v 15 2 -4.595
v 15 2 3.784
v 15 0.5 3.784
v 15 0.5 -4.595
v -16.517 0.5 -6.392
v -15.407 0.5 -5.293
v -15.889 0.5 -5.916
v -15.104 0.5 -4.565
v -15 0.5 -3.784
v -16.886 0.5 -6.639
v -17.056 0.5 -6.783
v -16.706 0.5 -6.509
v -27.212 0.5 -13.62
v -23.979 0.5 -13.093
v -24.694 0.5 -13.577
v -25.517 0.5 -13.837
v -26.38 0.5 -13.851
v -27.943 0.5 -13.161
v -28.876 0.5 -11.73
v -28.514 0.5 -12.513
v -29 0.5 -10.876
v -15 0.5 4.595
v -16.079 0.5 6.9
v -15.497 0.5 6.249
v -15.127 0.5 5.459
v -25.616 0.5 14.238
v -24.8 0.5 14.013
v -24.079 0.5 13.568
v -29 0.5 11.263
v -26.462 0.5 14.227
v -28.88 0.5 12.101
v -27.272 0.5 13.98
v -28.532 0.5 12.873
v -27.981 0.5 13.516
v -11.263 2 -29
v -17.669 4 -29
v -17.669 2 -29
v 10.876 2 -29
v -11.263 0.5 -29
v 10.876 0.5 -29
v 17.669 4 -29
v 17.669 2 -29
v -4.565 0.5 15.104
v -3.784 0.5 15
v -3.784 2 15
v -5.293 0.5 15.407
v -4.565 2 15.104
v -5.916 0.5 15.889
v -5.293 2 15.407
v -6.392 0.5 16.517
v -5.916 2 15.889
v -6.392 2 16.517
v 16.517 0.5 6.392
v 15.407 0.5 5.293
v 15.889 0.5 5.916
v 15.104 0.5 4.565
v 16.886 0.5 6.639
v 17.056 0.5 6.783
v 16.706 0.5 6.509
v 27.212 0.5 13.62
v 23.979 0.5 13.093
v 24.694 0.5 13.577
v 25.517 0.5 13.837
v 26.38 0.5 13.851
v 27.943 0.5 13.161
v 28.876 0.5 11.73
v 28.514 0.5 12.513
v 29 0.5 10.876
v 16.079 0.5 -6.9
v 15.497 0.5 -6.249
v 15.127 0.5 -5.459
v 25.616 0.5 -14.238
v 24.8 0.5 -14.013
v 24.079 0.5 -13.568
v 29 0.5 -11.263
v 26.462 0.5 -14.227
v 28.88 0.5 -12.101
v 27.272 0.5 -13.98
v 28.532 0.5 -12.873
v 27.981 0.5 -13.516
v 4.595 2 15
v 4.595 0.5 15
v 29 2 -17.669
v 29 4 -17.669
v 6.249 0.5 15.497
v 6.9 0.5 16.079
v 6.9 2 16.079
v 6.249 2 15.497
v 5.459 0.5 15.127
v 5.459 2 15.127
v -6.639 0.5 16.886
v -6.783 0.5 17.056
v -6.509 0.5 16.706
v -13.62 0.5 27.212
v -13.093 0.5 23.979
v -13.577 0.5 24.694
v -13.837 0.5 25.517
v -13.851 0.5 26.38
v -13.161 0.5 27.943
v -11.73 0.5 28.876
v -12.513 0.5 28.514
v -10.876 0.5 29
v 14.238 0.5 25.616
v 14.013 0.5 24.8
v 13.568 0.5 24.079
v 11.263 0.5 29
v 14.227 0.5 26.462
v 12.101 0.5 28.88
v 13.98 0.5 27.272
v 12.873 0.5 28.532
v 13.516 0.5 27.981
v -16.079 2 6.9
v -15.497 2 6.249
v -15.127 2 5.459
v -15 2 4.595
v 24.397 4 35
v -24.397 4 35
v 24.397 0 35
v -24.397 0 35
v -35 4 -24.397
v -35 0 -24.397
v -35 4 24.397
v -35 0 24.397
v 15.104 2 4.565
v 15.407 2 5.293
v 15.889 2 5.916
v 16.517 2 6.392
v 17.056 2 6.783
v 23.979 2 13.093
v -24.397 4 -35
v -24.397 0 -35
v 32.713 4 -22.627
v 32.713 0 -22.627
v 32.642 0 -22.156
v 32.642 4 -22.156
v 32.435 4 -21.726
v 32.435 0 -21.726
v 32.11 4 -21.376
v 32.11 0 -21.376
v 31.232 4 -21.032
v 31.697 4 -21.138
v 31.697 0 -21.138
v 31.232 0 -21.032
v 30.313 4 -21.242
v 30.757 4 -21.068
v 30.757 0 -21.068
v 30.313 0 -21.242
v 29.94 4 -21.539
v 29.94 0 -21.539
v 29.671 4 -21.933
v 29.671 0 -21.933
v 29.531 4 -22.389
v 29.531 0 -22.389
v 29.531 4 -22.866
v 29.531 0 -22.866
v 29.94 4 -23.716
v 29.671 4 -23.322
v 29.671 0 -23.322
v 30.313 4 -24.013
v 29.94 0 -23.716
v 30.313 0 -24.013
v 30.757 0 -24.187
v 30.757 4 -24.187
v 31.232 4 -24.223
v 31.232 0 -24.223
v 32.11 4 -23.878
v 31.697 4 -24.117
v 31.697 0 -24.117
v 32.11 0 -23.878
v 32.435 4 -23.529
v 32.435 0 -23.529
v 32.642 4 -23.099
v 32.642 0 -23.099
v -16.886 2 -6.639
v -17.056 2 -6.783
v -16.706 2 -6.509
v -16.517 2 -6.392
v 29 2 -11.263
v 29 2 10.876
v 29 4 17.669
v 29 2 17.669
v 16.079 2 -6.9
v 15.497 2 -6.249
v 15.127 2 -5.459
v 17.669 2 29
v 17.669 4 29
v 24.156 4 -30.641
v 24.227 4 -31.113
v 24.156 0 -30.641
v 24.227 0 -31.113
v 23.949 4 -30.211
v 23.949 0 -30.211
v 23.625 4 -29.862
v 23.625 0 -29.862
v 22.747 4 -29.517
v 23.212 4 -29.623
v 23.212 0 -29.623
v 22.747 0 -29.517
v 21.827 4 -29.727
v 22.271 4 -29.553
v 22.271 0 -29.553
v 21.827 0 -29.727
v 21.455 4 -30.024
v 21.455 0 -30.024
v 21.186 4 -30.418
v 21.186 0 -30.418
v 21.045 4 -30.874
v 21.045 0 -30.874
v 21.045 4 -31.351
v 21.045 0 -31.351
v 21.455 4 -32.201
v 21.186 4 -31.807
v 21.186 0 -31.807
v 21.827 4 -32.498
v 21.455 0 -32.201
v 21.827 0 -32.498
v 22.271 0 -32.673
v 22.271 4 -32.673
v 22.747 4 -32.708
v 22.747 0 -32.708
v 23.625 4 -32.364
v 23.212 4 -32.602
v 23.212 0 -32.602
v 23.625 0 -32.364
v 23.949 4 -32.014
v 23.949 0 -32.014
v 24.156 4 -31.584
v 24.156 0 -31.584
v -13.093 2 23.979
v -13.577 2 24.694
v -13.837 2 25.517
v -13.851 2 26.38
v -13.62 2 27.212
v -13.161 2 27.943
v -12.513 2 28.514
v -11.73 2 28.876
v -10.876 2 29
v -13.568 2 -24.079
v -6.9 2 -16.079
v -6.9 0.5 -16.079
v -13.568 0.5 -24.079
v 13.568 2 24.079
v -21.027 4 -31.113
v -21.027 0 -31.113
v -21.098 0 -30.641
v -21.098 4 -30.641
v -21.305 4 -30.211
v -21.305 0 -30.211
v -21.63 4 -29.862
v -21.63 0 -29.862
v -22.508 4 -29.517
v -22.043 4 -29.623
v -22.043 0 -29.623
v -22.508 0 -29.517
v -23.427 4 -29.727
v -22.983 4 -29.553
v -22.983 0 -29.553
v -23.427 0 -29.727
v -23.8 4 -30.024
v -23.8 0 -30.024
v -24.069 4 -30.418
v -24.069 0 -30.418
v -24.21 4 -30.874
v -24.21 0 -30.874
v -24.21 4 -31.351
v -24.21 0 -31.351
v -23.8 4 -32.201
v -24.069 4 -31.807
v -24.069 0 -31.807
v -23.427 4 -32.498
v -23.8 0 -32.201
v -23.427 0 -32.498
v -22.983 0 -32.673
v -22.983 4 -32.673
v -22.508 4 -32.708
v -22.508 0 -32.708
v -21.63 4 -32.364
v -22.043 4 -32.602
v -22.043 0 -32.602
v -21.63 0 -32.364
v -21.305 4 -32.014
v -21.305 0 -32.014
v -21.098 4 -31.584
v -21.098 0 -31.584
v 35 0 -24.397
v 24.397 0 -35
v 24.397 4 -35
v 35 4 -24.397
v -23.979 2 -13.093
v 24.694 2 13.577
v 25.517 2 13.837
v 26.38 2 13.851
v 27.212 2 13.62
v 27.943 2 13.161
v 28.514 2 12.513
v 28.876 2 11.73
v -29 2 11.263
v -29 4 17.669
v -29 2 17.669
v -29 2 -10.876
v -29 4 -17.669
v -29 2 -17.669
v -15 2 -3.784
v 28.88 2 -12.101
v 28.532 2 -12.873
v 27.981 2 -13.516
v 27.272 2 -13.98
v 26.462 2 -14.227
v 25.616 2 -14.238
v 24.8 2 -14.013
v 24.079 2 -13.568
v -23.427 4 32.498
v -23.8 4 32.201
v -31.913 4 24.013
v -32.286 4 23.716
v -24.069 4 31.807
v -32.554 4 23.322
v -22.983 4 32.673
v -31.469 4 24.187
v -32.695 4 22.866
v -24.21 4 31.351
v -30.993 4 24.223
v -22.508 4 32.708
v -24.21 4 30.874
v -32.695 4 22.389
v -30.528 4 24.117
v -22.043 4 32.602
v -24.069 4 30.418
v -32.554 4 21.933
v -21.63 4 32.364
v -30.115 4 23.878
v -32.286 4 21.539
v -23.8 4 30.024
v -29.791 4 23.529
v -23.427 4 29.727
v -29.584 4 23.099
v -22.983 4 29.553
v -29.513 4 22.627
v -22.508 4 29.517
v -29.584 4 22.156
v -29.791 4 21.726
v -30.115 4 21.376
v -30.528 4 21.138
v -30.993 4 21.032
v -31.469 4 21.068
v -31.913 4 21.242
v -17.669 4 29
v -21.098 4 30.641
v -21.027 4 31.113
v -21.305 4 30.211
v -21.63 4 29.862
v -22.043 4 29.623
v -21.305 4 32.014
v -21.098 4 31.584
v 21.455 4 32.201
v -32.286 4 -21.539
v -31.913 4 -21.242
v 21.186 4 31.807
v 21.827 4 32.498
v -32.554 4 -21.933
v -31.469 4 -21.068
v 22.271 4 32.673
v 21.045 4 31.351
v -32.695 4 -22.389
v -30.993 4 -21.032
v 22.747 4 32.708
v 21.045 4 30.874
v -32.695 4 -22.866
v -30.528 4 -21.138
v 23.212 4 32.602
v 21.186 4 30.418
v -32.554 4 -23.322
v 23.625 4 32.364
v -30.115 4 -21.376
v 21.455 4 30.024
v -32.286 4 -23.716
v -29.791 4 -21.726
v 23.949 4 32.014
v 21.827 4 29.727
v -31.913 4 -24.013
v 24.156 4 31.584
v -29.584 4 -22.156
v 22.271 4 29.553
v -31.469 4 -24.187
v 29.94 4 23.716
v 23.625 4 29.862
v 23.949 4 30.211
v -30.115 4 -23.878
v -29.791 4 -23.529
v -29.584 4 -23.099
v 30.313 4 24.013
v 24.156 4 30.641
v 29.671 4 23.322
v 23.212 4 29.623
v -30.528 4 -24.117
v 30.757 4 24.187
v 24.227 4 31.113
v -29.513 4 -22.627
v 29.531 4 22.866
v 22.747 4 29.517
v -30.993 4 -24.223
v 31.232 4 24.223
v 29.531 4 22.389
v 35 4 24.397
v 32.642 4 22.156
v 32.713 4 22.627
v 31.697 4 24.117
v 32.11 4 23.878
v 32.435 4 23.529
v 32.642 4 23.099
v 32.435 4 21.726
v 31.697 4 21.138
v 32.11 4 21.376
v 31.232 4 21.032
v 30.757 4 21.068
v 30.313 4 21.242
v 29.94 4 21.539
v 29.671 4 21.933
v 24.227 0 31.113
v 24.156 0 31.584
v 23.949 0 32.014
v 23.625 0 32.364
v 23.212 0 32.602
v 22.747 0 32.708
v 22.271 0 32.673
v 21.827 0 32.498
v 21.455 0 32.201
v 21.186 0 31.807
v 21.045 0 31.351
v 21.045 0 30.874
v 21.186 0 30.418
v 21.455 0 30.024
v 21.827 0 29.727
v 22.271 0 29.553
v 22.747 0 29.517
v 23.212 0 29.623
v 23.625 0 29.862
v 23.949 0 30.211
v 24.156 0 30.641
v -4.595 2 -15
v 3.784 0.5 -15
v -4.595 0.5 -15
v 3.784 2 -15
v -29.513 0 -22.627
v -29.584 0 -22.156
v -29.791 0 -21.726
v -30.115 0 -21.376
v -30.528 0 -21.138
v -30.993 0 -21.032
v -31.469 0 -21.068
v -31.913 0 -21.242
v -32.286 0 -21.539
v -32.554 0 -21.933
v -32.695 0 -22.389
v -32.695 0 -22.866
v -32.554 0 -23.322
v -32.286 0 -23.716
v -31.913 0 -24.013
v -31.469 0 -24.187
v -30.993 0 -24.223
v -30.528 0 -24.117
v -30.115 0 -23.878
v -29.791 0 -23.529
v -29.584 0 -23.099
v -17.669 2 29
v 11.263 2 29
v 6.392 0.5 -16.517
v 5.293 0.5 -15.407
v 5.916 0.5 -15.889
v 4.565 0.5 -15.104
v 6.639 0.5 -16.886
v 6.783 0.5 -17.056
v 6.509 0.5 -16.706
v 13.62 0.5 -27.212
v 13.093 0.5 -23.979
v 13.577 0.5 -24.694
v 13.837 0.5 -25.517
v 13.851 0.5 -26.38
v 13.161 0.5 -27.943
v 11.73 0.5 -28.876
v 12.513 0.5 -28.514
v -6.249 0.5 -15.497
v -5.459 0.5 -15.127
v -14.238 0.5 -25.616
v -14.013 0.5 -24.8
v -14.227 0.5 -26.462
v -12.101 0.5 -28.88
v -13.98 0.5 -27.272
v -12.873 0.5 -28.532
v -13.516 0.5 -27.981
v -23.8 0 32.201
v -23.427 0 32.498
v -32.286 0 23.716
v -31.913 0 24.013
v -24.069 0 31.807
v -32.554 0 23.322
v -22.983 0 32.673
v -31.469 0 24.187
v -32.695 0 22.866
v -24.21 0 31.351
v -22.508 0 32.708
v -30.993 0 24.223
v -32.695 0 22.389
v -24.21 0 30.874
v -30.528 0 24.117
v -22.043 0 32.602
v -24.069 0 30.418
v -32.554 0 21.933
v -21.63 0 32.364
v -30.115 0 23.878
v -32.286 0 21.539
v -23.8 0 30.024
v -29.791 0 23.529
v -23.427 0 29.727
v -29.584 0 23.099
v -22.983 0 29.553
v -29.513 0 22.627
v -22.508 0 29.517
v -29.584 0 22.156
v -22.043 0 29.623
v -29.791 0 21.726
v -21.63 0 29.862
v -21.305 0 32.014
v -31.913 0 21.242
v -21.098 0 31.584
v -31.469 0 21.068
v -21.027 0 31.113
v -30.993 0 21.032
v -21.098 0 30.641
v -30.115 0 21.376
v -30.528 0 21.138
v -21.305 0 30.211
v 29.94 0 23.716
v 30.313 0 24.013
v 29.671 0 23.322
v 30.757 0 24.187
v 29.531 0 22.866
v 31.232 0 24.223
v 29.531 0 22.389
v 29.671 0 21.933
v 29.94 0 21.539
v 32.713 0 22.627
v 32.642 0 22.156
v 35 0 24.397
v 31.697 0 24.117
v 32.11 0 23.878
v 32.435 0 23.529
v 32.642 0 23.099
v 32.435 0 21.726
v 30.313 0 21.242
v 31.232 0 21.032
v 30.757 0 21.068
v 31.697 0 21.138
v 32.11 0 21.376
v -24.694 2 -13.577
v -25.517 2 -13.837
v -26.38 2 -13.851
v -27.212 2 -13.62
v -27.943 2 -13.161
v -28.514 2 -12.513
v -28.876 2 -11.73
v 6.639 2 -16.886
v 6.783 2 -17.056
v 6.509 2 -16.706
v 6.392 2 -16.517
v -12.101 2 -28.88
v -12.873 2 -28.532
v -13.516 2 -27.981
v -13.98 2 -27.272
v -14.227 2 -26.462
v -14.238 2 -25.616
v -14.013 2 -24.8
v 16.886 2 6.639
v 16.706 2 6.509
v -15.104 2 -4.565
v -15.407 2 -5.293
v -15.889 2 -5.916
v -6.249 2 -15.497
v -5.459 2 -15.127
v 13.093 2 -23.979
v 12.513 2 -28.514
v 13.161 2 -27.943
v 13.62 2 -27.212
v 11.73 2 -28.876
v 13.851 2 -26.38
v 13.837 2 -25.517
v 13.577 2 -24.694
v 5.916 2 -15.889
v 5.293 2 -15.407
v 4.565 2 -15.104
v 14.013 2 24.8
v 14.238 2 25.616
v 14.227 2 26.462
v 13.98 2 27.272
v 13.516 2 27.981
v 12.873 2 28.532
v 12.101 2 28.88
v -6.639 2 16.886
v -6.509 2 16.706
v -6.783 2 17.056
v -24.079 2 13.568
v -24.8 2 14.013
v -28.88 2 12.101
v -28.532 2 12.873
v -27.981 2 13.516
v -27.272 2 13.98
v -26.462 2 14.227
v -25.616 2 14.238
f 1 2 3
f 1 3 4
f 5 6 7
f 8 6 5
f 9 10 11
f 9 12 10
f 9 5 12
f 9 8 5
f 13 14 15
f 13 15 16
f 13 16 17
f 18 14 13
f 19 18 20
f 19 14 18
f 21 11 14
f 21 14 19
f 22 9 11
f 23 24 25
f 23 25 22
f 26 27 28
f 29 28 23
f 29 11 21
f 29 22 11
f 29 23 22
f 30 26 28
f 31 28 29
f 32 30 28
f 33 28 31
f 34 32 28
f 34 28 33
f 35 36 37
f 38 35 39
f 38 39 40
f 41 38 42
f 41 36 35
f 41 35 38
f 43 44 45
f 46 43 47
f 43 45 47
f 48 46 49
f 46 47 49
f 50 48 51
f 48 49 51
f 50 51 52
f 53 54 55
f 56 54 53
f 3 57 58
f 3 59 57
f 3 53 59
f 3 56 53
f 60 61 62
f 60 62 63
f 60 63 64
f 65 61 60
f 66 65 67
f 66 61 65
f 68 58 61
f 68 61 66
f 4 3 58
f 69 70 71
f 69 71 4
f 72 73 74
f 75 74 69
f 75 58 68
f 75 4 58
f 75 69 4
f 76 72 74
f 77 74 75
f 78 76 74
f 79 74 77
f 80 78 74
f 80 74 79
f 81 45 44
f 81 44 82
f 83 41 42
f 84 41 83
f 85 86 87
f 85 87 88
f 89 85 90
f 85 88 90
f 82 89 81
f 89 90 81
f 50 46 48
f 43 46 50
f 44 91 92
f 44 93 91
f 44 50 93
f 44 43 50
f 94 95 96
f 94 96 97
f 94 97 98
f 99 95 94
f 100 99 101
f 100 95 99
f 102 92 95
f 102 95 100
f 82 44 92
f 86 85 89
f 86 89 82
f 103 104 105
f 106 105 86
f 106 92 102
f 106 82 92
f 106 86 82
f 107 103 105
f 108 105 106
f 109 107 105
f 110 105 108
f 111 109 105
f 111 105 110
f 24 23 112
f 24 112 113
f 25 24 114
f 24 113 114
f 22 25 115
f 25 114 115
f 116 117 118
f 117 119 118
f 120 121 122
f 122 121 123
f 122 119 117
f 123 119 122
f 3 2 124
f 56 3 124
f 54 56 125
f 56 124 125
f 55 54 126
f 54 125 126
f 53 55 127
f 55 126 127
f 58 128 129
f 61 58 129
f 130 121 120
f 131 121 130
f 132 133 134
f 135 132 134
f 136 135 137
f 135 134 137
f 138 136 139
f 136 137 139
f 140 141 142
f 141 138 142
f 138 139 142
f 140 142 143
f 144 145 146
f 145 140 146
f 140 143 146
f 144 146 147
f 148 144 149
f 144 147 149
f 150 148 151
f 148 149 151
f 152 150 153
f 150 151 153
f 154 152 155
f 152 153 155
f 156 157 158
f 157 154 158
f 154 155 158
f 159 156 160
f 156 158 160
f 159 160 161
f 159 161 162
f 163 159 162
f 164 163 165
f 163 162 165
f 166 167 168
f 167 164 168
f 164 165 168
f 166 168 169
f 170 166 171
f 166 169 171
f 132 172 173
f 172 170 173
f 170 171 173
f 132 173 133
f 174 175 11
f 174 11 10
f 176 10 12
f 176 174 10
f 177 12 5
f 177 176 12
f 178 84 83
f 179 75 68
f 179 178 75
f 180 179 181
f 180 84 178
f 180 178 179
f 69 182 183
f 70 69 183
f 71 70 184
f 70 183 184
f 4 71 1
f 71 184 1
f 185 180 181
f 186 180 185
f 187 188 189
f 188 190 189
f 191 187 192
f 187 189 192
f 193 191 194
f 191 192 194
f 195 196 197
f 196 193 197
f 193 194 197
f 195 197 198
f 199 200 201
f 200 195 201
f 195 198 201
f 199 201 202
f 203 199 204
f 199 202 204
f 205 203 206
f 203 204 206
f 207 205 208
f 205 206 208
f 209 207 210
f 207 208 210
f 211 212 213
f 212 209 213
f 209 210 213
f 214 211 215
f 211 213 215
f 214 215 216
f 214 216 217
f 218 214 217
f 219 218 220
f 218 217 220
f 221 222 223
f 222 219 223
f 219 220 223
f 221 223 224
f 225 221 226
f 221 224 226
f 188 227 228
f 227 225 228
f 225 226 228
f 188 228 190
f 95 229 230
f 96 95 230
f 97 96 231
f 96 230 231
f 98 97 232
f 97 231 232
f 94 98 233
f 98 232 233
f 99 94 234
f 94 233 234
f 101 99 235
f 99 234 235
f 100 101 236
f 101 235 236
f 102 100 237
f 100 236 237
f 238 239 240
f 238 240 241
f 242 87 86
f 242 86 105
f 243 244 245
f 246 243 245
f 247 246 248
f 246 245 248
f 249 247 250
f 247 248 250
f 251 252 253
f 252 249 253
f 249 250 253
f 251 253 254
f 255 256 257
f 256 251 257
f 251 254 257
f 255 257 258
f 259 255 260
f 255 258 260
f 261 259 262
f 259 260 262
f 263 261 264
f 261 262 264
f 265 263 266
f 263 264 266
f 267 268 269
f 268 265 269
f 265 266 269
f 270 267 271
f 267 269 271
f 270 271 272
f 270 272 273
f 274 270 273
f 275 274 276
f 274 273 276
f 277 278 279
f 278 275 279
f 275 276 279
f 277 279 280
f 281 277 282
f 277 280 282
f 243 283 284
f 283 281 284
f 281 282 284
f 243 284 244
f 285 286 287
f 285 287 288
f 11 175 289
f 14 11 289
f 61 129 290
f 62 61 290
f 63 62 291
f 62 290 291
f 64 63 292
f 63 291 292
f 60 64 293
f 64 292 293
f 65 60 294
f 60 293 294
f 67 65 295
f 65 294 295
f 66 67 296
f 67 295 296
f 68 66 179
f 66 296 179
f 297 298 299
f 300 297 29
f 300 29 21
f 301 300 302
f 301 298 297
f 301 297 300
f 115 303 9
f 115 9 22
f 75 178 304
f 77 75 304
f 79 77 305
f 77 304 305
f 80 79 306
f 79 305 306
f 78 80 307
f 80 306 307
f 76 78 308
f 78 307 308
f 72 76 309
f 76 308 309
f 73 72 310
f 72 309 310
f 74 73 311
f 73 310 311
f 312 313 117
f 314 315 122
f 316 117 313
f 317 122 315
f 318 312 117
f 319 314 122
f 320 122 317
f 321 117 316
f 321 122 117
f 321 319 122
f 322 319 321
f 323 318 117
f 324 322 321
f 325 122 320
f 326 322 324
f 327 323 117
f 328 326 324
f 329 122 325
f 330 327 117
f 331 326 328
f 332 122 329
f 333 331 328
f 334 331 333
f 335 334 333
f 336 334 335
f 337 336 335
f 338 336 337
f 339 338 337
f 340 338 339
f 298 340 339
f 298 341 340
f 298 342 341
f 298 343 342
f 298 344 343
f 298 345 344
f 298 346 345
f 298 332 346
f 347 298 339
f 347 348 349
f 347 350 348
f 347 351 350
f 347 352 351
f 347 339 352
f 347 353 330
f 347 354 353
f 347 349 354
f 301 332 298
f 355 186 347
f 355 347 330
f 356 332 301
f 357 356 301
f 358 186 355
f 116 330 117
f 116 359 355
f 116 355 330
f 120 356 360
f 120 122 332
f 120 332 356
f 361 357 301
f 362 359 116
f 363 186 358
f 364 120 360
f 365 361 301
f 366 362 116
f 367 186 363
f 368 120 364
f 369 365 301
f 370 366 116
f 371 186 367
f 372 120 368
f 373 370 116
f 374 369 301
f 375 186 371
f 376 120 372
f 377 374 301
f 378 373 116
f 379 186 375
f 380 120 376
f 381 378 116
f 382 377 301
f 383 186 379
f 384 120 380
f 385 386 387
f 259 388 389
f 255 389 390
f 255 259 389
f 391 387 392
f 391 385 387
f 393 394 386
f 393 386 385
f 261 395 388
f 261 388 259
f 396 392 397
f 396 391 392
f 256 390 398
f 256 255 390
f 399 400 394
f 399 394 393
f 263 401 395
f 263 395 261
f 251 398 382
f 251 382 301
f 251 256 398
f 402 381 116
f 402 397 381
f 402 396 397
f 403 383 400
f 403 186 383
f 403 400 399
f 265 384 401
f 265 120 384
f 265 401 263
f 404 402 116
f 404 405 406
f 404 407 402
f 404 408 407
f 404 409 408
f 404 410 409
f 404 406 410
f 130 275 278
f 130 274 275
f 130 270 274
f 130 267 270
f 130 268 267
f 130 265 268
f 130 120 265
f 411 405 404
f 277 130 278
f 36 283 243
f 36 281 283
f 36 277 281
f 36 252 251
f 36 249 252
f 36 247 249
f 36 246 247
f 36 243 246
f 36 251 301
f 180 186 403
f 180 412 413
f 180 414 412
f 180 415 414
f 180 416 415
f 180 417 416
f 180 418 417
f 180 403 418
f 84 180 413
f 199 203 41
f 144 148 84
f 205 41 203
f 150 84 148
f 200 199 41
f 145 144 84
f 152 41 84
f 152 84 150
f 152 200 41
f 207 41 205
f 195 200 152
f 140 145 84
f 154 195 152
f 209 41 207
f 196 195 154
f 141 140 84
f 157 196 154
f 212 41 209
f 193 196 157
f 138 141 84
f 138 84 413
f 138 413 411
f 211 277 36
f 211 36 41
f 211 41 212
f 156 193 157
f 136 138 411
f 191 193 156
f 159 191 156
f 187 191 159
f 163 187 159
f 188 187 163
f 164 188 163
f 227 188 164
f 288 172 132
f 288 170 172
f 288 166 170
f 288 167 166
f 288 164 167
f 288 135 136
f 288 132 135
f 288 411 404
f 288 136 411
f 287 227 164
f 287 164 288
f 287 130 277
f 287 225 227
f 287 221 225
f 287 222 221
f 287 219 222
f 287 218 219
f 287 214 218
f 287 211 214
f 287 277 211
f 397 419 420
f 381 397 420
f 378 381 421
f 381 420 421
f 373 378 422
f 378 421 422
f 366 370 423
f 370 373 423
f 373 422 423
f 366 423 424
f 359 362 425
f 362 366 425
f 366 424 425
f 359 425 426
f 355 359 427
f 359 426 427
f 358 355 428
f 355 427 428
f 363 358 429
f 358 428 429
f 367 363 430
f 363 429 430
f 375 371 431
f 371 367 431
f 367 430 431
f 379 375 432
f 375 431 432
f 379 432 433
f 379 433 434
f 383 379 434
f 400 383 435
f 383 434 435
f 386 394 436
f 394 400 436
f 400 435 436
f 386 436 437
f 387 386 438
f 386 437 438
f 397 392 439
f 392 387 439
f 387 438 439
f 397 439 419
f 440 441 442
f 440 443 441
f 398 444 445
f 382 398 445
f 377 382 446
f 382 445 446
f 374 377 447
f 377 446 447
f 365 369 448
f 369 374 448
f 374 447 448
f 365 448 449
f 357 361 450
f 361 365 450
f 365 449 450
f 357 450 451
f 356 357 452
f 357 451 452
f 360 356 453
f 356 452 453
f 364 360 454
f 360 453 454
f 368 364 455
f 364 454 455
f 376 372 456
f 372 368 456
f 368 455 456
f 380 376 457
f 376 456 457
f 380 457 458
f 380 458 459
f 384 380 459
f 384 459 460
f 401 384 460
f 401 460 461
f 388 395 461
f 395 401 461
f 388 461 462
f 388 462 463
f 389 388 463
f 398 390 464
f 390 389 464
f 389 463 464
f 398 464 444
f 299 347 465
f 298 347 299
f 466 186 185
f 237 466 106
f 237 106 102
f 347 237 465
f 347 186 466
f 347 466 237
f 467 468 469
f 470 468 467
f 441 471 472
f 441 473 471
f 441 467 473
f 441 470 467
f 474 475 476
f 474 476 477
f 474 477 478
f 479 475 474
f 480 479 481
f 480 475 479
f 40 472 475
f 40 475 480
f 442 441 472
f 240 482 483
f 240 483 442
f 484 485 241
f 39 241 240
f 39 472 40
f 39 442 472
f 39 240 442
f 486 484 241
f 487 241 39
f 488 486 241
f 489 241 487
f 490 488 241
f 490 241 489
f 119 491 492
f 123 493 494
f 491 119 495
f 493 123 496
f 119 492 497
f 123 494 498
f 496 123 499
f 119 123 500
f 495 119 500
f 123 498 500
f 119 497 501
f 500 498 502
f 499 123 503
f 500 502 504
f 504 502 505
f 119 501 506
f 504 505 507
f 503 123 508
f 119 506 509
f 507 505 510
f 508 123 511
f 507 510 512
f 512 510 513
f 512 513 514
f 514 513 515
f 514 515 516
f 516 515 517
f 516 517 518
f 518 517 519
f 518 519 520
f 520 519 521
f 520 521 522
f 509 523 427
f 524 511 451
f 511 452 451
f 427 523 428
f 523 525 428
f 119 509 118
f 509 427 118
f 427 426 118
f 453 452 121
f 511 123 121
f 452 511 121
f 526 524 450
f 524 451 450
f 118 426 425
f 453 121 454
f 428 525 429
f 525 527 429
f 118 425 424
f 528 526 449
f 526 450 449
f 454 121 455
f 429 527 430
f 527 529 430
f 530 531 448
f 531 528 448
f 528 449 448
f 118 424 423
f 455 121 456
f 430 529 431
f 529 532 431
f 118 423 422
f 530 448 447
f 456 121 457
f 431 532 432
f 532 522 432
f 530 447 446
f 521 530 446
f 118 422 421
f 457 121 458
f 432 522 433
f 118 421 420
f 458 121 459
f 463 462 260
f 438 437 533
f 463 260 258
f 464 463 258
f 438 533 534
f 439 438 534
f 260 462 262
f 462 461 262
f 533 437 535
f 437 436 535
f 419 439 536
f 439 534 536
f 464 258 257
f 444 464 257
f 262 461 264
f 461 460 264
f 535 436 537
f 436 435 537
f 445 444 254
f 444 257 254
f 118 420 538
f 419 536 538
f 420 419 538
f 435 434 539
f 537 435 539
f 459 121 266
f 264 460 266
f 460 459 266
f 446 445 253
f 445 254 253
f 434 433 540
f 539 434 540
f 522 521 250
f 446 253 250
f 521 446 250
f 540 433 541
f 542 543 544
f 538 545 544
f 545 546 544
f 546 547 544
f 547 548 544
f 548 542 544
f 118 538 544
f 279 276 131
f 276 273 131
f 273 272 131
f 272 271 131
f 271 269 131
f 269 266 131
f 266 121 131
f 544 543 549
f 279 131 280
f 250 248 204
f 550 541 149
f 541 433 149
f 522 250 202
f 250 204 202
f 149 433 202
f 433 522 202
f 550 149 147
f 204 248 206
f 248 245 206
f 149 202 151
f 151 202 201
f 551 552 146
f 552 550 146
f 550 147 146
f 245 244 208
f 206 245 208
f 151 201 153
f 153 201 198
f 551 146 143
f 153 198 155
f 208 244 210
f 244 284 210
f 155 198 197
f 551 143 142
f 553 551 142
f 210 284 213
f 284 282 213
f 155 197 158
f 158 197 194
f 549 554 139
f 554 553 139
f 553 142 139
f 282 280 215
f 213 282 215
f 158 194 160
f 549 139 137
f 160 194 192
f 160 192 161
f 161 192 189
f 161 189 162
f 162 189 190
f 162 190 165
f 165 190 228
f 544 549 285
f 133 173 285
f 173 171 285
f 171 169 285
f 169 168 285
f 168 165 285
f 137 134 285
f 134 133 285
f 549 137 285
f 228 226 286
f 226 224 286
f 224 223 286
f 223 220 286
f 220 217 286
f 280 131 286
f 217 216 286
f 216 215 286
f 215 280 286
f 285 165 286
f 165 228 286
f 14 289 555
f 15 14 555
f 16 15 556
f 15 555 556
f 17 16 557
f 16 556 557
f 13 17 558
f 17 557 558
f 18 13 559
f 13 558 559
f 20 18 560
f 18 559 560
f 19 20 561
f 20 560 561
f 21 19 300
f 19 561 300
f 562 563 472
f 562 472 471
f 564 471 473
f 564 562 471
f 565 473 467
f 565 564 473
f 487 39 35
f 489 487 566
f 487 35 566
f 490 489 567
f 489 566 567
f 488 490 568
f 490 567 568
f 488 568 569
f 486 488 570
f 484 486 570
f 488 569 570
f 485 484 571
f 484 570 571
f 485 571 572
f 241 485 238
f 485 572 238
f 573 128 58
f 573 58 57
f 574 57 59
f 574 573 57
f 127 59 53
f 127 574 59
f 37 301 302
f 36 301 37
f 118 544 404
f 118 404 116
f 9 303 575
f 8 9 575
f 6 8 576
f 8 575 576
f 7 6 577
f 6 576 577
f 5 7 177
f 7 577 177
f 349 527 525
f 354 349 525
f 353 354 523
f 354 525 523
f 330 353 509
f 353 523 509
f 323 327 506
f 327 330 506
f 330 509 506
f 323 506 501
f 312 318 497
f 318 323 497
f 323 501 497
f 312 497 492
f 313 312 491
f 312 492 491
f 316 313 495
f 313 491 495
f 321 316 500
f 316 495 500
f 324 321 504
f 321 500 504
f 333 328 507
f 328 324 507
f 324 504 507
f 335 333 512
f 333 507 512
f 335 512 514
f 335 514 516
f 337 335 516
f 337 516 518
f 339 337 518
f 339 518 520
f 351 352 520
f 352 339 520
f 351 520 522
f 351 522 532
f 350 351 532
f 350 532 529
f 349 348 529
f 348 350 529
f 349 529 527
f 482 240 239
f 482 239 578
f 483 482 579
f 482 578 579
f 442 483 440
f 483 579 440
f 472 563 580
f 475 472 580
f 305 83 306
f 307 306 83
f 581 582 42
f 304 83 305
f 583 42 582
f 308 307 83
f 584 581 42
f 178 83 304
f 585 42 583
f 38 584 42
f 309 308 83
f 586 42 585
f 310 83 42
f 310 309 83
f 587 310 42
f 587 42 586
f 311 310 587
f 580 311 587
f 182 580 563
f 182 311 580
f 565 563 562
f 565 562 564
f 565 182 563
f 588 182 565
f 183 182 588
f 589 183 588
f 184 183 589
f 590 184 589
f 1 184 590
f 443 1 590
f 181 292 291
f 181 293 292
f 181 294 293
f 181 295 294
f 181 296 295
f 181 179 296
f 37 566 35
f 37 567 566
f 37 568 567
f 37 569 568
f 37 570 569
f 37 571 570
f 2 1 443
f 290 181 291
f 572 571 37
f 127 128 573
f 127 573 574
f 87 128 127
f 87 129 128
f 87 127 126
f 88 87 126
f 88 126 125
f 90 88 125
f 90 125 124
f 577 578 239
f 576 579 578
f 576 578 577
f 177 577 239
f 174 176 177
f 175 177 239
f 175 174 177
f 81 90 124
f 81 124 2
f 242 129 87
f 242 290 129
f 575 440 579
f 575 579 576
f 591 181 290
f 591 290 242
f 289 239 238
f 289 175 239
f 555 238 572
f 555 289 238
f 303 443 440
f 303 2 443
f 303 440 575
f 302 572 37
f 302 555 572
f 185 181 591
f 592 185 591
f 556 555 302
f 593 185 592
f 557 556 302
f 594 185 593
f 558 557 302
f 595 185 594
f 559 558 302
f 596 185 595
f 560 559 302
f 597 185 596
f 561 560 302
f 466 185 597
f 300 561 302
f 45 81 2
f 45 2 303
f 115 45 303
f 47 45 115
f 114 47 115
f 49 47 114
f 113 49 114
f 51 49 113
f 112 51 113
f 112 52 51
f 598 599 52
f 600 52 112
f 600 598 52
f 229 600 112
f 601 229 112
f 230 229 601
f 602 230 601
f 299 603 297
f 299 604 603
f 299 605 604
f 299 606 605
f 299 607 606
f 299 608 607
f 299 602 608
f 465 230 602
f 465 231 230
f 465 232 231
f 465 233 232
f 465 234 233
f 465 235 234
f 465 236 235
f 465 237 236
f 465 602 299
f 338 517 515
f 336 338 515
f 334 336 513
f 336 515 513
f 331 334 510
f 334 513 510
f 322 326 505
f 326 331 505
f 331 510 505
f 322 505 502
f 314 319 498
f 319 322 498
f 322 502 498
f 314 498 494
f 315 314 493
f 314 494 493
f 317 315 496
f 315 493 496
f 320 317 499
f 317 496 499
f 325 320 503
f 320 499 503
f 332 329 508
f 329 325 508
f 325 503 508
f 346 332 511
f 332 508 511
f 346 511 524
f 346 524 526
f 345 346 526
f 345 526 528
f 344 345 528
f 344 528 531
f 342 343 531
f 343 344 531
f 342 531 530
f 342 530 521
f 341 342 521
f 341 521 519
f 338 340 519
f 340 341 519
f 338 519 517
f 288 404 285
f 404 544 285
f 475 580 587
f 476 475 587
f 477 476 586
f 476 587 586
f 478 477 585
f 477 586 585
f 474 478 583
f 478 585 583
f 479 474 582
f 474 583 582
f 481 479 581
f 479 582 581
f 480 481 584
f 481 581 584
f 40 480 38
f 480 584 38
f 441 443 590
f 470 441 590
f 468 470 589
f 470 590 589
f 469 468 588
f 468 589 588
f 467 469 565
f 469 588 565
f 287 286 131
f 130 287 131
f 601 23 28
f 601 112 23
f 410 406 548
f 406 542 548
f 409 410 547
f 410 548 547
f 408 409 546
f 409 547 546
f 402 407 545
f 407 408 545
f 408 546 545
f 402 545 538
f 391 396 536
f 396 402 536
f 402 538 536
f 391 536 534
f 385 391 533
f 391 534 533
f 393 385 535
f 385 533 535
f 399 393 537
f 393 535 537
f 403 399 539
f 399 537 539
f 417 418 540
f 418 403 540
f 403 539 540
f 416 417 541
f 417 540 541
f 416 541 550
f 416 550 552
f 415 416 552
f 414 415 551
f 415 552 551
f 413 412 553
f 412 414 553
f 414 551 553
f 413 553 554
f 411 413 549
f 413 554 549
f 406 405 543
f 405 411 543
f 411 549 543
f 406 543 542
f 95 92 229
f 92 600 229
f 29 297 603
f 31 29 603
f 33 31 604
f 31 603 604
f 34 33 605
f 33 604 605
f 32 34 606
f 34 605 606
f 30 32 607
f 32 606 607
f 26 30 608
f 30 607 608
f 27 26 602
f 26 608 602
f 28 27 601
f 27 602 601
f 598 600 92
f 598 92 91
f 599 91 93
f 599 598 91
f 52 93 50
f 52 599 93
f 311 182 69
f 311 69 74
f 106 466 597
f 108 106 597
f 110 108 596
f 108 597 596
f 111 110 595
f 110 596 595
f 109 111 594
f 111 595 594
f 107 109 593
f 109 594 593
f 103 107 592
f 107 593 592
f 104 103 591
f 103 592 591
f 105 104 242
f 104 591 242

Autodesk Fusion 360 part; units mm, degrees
sketch "Sketch1" plane through (0, 0, 0) normal (0, 1, 0) x (1, 0, 0)
  line L0 (35, 35) -> (-35, 35)
  line L1 (-35, 35) -> (-35, -35)
  line L2 (-35, -35) -> (35, -35)
  line L3 (35, -35) -> (35, 35)
  line L4 (35, 35) -> (-35, -35) construction
  line L5 (-35, 35) -> (35, -35) construction
  line L6 (0, 0) -> (9.2688, 9.2688) construction
  line L7 (0, 0) -> (84.8528, 84.8528) construction
  line L8 (0, 0) -> (0, 35) construction
  line L9 (12.5, 35) -> (-12.5, 35)
  line L10 (-35, 12.5) -> (-35, -12.5)
  line L11 (-12.5, -35) -> (12.5, -35)
  line L12 (35, -12.5) -> (35, 12.5)
  line L13 (20.5061, 33.234) -> (33.234, 20.5061) construction
  line L14 (23.3345, 36.0624) -> (36.0624, 23.3345)
  line L15 (12.5, 35) -> (23.3345, 36.0624)
  line L16 (35, 12.5) -> (36.0624, 23.3345)
  circle A0 centre (22.6274, 31.1127) radius 1.6
  circle A1 centre (31.1127, 22.6274) radius 1.6
  line L17 (-35, 12.5) -> (-36.0624, 23.3345)
  line L18 (-36.0624, 23.3345) -> (-23.3345, 36.0624)
  line L19 (-12.5, 35) -> (-23.3345, 36.0624)
  circle A2 centre (-22.6274, 31.1127) radius 1.6
  circle A3 centre (-31.1127, 22.6274) radius 1.6
  line L20 (-12.5, -35) -> (-23.3345, -36.0624)
  line L21 (-23.3345, -36.0624) -> (-36.0624, -23.3345)
  line L22 (-35, -12.5) -> (-36.0624, -23.3345)
  circle A4 centre (-31.1127, -22.6274) radius 1.6
  circle A5 centre (-22.6274, -31.1127) radius 1.6
  line L23 (35, -12.5) -> (36.0624, -23.3345)
  line L24 (36.0624, -23.3345) -> (23.3345, -36.0624)
  line L25 (12.5, -35) -> (23.3345, -36.0624)
  circle A6 centre (22.6274, -31.1127) radius 1.6
  circle A7 centre (31.1127, -22.6274) radius 1.6
  dimension "d3" = 70
  dimension "d4" = 70
  dimension "d5" = 120
  dimension "d6" = 25
  dimension "d7" = 12.5
  dimension "d9" = 360
  dimension "d12" = 82
  dimension "d13" = 9
  dimension "d15" = 4
  dimension "d16" = 3.2
  dimension "d17" = 6
  dimension "d18" = 6
  dimension "d20" = 360
extrude "Extrude1" add sketch "Sketch1" along normal blind 4 contours L0 L1 L2 L3 L9 L10 L11 L12 L14 L18 L21 L24
sketch "Sketch2" plane through (0, 4, 0) normal (0, 1, 0) x (-1, 0, 0)
  circle A0 centre (-22.6274, 31.1127) radius 1.6
  circle A1 centre (-31.1127, 22.6274) radius 1.6
  circle A2 centre (31.1127, -22.6274) radius 1.6
  circle A3 centre (31.1127, 22.6274) radius 1.6
  circle A4 centre (22.6274, 31.1127) radius 1.6
  circle A5 centre (22.6274, -31.1127) radius 1.6
  circle A6 centre (-31.1127, -22.6274) radius 1.6
  circle A7 centre (-22.6274, -31.1127) radius 1.6
  line L0 (24.397, 35) -> (-24.397, 35)
  line L1 (-24.397, 35) -> (-35, 24.397)
  line L2 (-35, 24.397) -> (-35, -24.397)
  line L3 (-35, -24.397) -> (-24.397, -35)
  line L4 (-24.397, -35) -> (24.397, -35)
  line L5 (24.397, -35) -> (35, -24.397)
  line L6 (35, -24.397) -> (35, 24.397)
  line L7 (35, 24.397) -> (24.397, 35)
  line L8 (0, 0) -> (0, -35) construction
  line L9 (0, 0) -> (35, 0) construction
  line L10 (17.669, -29) -> (-17.669, -29)
  line L11 (-17.669, -29) -> (-29, -17.669)
  line L12 (-29, -17.669) -> (-29, 17.669)
  line L13 (-29, 17.669) -> (-17.669, 29)
  line L14 (-17.669, 29) -> (17.669, 29)
  line L15 (17.669, 29) -> (29, 17.669)
  line L16 (29, 17.669) -> (29, -17.669)
  line L17 (29, -17.669) -> (17.669, -29)
  dimension "d23" = 6
  dimension "d24" = 6
  dimension "d25" = 9
  dimension "d26" = 9
extrude "Extrude2" cut sketch "Sketch2" against normal blind 2 contours L10 L11 L12 L13 L14 L15 L16 L17
sketch "Sketch3" plane through (0, 2, 0) normal (0, 1, 0) x (-1, 0, 0)
  line L0 (29, -17.669) -> (29, 17.669)
  line L1 (29, 17.669) -> (17.669, 29)
  line L2 (17.669, 29) -> (-17.669, 29)
  line L3 (-17.669, 29) -> (-29, 17.669)
  line L4 (-29, 17.669) -> (-29, -17.669)
  line L5 (-29, -17.669) -> (-17.669, -29)
  line L6 (-17.669, -29) -> (17.669, -29)
  line L7 (17.669, -29) -> (29, -17.669)
  line L8 (0, 0) -> (0, -29) construction
  line L9 (0, 0) -> (29, 0) construction
  line L10 (15, -3.7839) -> (15, 4.5951)
  line L11 (16.0792, 6.8995) -> (24.0792, 13.5676)
  line L12 (15, -6) -> (15.0349, -6)
  line L13 (17.0557, -6.7828) -> (23.9792, -13.0929)
  line L14 (29, -10.8757) -> (29, 11.2631)
  arc A0 (23.9792, -13.0929) -> (29, -10.8757) centre (26, -10.8757) ccw
  arc A1 (29, 11.2631) -> (24.0792, 13.5676) centre (26, 11.2631) ccw
  arc A2 (16.0792, 6.8995) -> (15, 4.5951) centre (18, 4.5951) ccw
  arc A3 (17.0557, -6.7828) -> (16.5174, -6.3919) centre (15.0349, -9) ccw
  arc A4 (15, -3.7839) -> (16.5174, -6.3919) centre (18, -3.7839) ccw
  arc A5 (13.0929, 23.9792) -> (10.8757, 29) centre (10.8757, 26) ccw
  line L15 (10.8757, 29) -> (-11.2631, 29)
  line L16 (6.7828, 17.0557) -> (13.0929, 23.9792)
  arc A6 (-11.2631, 29) -> (-13.5676, 24.0792) centre (-11.2631, 26) ccw
  line L17 (-6.8995, 16.0792) -> (-13.5676, 24.0792)
  arc A7 (-6.8995, 16.0792) -> (-4.5951, 15) centre (-4.5951, 18) ccw
  line L18 (3.7839, 15) -> (-4.5951, 15)
  arc A8 (3.7839, 15) -> (6.3919, 16.5174) centre (3.7839, 18) ccw
  arc A9 (-23.9792, 13.0929) -> (-29, 10.8757) centre (-26, 10.8757) ccw
  line L19 (-29, 10.8757) -> (-29, -11.2631)
  line L20 (-17.0557, 6.7828) -> (-23.9792, 13.0929)
  arc A10 (-29, -11.2631) -> (-24.0792, -13.5676) centre (-26, -11.2631) ccw
  line L21 (-16.0792, -6.8995) -> (-24.0792, -13.5676)
  arc A11 (-16.0792, -6.8995) -> (-15, -4.5951) centre (-18, -4.5951) ccw
  line L22 (-15, 3.7839) -> (-15, -4.5951)
  arc A12 (-15, 3.7839) -> (-16.5174, 6.3919) centre (-18, 3.7839) ccw
  arc A13 (-13.0929, -23.9792) -> (-10.8757, -29) centre (-10.8757, -26) ccw
  line L23 (-10.8757, -29) -> (11.2631, -29)
  line L24 (-6.7828, -17.0557) -> (-13.0929, -23.9792)
  arc A14 (11.2631, -29) -> (13.5676, -24.0792) centre (11.2631, -26) ccw
  line L25 (6.8995, -16.0792) -> (13.5676, -24.0792)
  arc A15 (6.8995, -16.0792) -> (4.5951, -15) centre (4.5951, -18) ccw
  line L26 (-3.7839, -15) -> (4.5951, -15)
  arc A16 (-3.7839, -15) -> (-6.3919, -16.5174) centre (-3.7839, -18) ccw
  line L27 (10.8757, 29) -> (-11.2631, 29)
  point P0 (15, 6)
  dimension "d29" = 15
  dimension "d30" = 12
  dimension "d31" = 6
  dimension "d32" = 3
  dimension "d34" = 360
extrude "Extrude3" cut sketch "Sketch3" against normal blind 1.5 contours L0 L10 L11 L13 L14 A0 A1 A2 A3 A4
pattern_circular "C-Pattern1" count 4 over 360 about axis through (0, 1.75, 0) along (0, 1, 0) of "Extrude3"
sketch "Sketch4" plane through (0, 2, 0) normal (0, 1, 0) x (-1, 0, 0)
  arc A0 (-13.0929, -23.9792) -> (-10.8757, -29) centre (-10.8757, -26) ccw
  line L0 (-13.0929, -23.9792) -> (-6.7828, -17.0557)
  arc A1 (-6.7828, -17.0557) -> (-6.3919, -16.5174) centre (-9, -15.0349) ccw
  arc A2 (-3.7839, -15) -> (-6.3919, -16.5174) centre (-3.7839, -18) ccw
  line L1 (-3.7839, -15) -> (4.5951, -15)
  arc A3 (6.8995, -16.0792) -> (4.5951, -15) centre (4.5951, -18) ccw
  line L2 (6.8995, -16.0792) -> (13.5676, -24.0792)
  arc A4 (11.2631, -29) -> (13.5676, -24.0792) centre (11.2631, -26) ccw
  line L3 (11.2631, -29) -> (17.669, -29)
  line L4 (17.669, -29) -> (29, -17.669)
  line L5 (29, -17.669) -> (29, -10.8757)
  arc A5 (23.9792, -13.0929) -> (29, -10.8757) centre (26, -10.8757) ccw
  line L6 (23.9792, -13.0929) -> (17.0557, -6.7828)
  arc A6 (17.0557, -6.7828) -> (16.5174, -6.3919) centre (15.0349, -9) ccw
  arc A7 (15, -3.7839) -> (16.5174, -6.3919) centre (18, -3.7839) ccw
  line L7 (15, -3.7839) -> (15, 4.5951)
  arc A8 (16.0792, 6.8995) -> (15, 4.5951) centre (18, 4.5951) ccw
  line L8 (16.0792, 6.8995) -> (24.0792, 13.5676)
  arc A9 (29, 11.2631) -> (24.0792, 13.5676) centre (26, 11.2631) ccw
  line L9 (29, 11.2631) -> (29, 17.669)
  line L10 (29, 17.669) -> (17.669, 29)
  line L11 (17.669, 29) -> (10.8757, 29)
  arc A10 (13.0929, 23.9792) -> (10.8757, 29) centre (10.8757, 26) ccw
  line L12 (13.0929, 23.9792) -> (6.7828, 17.0557)
  arc A11 (6.7828, 17.0557) -> (6.3919, 16.5174) centre (9, 15.0349) ccw
  arc A12 (3.7839, 15) -> (6.3919, 16.5174) centre (3.7839, 18) ccw
  line L13 (3.7839, 15) -> (-4.5951, 15)
  arc A13 (-6.8995, 16.0792) -> (-4.5951, 15) centre (-4.5951, 18) ccw
  line L14 (-6.8995, 16.0792) -> (-13.5676, 24.0792)
  arc A14 (-11.2631, 29) -> (-13.5676, 24.0792) centre (-11.2631, 26) ccw
  line L15 (-11.2631, 29) -> (-17.669, 29)
  line L16 (-17.669, 29) -> (-29, 17.669)
  line L17 (-29, 17.669) -> (-29, 10.8757)
  arc A15 (-23.9792, 13.0929) -> (-29, 10.8757) centre (-26, 10.8757) ccw
  line L18 (-23.9792, 13.0929) -> (-17.0557, 6.7828)
  arc A16 (-17.0557, 6.7828) -> (-16.5174, 6.3919) centre (-15.0349, 9) ccw
  arc A17 (-15, 3.7839) -> (-16.5174, 6.3919) centre (-18, 3.7839) ccw
  line L19 (-15, 3.7839) -> (-15, -4.5951)
  arc A18 (-16.0792, -6.8995) -> (-15, -4.5951) centre (-18, -4.5951) ccw
  line L20 (-16.0792, -6.8995) -> (-24.0792, -13.5676)
  arc A19 (-29, -11.2631) -> (-24.0792, -13.5676) centre (-26, -11.2631) ccw
  line L21 (-29, -11.2631) -> (-29, -17.669)
  line L22 (-29, -17.669) -> (-17.669, -29)
  line L23 (-17.669, -29) -> (-10.8757, -29)
